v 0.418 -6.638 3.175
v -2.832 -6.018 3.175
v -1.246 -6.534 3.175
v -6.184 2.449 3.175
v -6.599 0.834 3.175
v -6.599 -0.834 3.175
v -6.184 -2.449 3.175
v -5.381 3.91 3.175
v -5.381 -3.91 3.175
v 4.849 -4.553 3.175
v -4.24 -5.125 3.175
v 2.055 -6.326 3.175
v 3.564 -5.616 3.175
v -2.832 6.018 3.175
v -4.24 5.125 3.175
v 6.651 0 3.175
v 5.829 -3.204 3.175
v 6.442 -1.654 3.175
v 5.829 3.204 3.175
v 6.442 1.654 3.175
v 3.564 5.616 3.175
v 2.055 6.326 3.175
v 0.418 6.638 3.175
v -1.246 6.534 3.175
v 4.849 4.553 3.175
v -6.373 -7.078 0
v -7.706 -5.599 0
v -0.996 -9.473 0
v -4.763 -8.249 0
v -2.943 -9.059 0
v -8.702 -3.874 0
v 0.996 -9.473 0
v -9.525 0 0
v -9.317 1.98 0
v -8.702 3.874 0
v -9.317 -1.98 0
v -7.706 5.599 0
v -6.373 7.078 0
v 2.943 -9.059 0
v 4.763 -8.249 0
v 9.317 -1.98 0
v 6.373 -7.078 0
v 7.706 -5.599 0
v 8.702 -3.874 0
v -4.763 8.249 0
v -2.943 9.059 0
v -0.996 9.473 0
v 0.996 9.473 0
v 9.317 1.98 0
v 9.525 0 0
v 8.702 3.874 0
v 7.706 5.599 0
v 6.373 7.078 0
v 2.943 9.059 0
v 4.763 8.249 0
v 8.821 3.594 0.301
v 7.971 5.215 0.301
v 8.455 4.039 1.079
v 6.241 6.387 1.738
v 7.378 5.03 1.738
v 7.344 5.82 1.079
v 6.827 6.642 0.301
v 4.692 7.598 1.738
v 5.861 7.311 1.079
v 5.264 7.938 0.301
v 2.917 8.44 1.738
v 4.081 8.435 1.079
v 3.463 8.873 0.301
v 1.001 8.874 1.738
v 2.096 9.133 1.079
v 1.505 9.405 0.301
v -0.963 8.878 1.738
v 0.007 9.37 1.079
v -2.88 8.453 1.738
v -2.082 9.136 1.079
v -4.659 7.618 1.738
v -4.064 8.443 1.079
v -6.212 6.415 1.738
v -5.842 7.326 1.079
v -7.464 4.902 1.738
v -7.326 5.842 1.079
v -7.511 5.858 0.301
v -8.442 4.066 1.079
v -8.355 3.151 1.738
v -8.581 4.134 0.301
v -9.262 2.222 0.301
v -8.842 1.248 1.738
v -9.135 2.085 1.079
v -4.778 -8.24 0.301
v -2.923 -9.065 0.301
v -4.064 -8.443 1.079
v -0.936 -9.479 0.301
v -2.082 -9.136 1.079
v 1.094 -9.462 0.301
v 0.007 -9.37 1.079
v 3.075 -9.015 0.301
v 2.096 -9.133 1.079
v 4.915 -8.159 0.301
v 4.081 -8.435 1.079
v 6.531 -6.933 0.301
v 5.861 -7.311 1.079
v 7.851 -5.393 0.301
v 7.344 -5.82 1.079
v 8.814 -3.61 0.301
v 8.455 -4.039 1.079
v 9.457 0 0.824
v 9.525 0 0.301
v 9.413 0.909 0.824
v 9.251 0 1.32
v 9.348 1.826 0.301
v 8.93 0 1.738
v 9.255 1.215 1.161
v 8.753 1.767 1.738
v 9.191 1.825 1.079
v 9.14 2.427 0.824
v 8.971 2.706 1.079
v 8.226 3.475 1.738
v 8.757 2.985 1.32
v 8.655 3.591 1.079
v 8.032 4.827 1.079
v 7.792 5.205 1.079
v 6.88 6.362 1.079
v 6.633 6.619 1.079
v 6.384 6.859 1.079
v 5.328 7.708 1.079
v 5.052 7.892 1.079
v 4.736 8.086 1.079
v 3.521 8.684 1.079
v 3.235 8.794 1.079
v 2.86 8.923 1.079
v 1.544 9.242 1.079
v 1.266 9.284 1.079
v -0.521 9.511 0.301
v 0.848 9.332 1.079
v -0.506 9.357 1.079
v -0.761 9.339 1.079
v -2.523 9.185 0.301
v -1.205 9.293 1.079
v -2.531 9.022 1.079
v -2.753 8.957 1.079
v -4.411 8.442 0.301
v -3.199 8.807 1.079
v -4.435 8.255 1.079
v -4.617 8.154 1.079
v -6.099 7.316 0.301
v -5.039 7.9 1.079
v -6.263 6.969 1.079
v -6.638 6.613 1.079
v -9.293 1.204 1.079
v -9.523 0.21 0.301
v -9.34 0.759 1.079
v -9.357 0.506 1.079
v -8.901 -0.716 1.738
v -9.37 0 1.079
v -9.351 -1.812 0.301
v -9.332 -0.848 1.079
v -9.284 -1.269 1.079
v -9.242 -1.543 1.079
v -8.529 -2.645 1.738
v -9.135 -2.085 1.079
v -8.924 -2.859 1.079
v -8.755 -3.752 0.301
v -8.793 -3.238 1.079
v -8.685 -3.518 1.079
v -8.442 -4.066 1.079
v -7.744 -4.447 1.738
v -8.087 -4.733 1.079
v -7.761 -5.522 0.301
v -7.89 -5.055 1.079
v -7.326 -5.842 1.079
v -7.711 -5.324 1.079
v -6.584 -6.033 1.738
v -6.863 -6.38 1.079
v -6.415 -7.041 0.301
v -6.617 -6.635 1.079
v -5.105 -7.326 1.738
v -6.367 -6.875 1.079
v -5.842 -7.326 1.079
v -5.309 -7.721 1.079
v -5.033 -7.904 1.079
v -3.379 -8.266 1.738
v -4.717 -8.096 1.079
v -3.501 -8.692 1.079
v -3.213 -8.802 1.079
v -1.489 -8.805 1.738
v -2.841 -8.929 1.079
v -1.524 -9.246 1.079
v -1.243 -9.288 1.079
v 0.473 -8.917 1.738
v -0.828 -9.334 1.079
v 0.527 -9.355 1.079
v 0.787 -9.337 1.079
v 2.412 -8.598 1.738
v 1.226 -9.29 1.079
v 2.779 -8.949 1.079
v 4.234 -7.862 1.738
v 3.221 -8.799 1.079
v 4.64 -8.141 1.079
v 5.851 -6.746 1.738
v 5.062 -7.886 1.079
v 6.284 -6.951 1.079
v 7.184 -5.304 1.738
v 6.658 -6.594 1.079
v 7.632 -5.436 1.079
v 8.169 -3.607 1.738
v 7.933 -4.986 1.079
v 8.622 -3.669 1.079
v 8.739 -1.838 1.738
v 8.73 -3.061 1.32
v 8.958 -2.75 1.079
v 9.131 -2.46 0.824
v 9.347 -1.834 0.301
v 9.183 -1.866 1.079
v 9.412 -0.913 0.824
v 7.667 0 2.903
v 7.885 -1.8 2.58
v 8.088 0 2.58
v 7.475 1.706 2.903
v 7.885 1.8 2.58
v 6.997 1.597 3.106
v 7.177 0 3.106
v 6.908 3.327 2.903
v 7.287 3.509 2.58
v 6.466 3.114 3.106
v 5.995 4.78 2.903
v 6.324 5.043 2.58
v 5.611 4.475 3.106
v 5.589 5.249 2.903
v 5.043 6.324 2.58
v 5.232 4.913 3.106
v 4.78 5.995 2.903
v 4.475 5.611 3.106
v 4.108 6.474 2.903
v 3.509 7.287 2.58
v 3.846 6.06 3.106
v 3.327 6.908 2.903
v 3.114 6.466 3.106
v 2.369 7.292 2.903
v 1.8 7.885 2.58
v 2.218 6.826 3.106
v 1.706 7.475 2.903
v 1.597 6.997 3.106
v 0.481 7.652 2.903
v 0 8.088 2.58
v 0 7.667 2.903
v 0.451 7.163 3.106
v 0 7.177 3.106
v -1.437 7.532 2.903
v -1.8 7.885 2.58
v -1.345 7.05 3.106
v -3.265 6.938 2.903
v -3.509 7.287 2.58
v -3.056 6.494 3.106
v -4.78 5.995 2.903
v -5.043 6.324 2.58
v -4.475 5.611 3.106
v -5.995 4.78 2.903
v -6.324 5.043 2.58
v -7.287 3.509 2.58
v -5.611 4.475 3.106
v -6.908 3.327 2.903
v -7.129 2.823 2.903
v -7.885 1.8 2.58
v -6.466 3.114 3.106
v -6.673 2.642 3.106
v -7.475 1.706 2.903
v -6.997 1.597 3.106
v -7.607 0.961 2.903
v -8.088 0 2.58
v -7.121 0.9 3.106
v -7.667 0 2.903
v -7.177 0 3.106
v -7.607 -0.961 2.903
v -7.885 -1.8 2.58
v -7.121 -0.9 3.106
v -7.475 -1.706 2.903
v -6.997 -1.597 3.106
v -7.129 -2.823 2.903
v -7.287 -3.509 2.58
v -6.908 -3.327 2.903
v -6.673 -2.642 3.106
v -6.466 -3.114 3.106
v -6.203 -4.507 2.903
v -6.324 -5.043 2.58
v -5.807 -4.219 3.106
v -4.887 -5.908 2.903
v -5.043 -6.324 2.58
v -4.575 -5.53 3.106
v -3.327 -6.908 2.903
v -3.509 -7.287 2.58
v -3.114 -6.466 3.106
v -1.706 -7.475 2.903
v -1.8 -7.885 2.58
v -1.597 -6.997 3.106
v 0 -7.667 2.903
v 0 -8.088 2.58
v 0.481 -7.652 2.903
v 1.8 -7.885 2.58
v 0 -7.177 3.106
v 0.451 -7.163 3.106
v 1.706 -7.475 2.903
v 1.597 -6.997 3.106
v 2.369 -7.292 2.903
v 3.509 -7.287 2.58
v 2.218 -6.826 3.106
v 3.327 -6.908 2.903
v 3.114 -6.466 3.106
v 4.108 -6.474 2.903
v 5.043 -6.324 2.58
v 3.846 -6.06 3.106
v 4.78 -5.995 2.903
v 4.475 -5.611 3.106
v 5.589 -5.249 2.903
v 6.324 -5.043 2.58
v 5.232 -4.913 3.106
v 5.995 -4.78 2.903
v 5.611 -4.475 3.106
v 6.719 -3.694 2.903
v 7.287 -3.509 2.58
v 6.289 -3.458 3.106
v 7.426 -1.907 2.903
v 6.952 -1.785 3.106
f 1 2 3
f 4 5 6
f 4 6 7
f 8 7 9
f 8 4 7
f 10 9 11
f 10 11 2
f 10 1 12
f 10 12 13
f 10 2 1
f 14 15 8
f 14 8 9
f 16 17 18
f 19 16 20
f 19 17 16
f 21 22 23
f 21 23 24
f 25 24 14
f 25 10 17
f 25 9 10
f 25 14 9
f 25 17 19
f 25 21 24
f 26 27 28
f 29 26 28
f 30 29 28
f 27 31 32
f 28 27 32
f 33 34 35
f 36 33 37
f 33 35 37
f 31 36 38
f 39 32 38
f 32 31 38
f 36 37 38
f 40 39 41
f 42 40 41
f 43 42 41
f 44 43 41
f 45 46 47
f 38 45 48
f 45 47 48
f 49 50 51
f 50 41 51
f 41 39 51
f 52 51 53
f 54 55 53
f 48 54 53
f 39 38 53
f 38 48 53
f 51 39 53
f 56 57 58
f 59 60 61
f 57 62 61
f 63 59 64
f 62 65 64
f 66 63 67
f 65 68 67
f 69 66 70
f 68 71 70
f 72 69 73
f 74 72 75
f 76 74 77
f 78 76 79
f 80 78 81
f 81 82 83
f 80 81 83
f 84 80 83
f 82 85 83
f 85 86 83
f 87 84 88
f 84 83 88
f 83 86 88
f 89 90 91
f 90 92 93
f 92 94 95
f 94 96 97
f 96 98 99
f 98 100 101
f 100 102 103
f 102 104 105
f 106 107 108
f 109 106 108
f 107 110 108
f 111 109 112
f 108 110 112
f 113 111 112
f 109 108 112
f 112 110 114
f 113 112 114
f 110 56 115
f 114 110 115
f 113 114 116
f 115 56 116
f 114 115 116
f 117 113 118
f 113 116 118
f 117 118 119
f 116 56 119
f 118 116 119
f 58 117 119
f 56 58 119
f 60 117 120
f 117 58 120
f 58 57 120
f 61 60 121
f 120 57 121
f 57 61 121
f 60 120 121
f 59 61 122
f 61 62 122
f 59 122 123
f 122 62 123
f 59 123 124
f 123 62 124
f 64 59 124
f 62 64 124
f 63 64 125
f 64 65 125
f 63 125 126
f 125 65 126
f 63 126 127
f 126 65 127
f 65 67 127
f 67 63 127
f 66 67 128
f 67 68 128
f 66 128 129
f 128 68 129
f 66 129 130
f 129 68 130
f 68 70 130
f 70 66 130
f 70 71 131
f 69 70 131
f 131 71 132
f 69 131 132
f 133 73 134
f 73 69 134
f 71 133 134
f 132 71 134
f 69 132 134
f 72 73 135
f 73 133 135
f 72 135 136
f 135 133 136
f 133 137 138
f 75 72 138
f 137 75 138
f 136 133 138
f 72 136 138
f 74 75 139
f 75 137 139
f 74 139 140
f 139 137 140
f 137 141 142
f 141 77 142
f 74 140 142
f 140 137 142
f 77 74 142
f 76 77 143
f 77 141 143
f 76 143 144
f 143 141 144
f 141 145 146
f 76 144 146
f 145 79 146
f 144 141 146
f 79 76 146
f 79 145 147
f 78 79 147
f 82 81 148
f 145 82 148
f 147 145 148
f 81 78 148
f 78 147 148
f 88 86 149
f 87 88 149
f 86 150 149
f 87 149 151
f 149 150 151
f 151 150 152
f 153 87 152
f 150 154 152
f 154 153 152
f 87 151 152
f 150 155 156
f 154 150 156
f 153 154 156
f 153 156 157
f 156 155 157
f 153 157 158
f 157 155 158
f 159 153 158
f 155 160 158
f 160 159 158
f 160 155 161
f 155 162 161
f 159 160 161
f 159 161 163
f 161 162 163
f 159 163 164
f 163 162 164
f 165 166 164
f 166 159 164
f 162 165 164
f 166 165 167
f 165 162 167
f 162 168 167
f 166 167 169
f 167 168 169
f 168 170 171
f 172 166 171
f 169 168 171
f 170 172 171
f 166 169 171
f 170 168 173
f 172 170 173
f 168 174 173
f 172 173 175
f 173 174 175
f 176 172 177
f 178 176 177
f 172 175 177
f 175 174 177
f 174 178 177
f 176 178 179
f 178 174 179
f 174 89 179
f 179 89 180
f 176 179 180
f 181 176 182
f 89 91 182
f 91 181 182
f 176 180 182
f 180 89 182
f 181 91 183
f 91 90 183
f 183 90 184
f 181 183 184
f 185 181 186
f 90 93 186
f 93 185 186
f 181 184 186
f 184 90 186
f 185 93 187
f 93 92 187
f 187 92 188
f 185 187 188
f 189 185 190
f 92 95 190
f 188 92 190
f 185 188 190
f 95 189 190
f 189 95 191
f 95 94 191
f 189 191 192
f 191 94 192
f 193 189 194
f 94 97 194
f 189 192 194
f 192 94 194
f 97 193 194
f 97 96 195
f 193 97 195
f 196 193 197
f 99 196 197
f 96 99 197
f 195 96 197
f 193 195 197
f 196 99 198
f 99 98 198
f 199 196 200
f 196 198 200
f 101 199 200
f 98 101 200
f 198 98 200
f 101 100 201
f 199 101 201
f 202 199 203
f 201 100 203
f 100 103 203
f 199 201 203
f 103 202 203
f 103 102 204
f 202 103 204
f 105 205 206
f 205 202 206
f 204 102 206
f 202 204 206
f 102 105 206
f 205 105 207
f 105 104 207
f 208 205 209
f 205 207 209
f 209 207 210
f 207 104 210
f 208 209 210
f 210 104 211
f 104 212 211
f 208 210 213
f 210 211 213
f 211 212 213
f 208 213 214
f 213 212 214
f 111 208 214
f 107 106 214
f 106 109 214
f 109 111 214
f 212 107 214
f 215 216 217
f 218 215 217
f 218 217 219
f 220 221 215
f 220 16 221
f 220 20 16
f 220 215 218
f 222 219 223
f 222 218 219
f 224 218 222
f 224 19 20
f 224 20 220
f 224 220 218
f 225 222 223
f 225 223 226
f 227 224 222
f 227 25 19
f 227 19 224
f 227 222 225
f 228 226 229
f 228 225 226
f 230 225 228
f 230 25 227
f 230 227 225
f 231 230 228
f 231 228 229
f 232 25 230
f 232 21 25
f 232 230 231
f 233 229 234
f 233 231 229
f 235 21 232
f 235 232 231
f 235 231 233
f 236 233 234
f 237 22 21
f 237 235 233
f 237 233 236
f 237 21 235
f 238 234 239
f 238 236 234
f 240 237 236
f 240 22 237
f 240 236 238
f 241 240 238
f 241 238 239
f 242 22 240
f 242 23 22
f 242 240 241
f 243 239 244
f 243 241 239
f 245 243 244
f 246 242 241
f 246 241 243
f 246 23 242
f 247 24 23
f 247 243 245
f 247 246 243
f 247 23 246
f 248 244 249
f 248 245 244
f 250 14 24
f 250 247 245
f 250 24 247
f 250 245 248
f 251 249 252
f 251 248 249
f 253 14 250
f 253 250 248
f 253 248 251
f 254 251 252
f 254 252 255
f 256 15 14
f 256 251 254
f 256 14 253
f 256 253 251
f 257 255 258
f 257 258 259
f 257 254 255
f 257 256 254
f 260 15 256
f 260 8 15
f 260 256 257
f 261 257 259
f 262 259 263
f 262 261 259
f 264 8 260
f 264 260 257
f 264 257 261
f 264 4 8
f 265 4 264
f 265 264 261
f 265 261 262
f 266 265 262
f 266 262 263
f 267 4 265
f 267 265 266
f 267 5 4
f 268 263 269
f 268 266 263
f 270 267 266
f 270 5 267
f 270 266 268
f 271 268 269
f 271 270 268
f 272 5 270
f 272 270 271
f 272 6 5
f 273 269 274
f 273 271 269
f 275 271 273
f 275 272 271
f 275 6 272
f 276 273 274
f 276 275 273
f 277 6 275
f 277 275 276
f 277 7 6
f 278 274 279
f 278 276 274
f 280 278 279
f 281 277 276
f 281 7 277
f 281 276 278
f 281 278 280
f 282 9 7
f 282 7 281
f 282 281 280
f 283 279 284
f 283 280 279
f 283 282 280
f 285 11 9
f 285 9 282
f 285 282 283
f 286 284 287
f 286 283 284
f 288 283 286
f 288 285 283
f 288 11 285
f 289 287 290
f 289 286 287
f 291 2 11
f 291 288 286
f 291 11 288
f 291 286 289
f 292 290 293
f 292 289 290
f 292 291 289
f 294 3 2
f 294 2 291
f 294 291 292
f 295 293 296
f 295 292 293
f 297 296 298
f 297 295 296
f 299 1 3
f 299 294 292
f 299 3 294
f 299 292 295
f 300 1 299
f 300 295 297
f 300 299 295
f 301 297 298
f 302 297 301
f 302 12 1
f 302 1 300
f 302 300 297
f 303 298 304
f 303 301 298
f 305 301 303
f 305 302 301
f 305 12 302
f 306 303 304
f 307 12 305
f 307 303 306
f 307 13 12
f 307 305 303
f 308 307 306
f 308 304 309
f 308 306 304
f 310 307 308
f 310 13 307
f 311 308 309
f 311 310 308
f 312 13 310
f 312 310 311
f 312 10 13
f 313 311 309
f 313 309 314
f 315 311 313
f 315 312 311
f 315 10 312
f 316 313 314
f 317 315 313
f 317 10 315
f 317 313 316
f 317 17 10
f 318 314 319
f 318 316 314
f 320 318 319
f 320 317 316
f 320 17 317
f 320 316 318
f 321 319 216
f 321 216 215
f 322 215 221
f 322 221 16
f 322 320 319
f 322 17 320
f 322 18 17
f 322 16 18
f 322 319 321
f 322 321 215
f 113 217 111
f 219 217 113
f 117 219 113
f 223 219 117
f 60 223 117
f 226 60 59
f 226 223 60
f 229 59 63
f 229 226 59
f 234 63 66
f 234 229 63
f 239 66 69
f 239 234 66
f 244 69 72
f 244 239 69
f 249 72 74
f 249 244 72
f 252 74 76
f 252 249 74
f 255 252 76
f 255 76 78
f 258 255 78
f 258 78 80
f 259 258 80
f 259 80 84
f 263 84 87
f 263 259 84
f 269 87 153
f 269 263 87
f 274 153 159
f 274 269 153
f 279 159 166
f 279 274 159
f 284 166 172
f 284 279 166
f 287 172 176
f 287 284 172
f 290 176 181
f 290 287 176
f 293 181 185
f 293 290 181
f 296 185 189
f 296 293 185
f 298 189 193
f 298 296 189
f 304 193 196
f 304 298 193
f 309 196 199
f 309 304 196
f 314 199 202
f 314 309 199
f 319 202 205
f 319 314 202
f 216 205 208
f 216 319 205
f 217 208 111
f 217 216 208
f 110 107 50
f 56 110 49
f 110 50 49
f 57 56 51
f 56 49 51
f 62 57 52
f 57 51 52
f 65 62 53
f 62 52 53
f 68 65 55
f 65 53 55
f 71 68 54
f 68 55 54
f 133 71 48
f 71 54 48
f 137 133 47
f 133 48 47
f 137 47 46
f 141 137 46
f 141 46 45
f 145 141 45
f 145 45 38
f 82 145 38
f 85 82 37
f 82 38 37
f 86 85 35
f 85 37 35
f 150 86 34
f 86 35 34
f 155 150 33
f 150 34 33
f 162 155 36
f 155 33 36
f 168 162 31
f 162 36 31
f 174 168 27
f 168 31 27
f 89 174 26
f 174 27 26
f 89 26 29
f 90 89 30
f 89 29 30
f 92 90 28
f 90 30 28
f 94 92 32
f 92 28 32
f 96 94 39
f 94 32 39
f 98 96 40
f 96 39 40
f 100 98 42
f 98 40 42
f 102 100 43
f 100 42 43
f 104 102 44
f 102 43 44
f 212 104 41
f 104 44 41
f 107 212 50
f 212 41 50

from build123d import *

# Parameters (mm, degrees)
F0_R     = 9.525
F1_DEPTH = 3.175
F2_SIZE  = 2.032
F3_R     = 2.032


with BuildPart() as f1:
    # F0 (on Top) → F1 (new body)
    with BuildSketch(Plane.XY):
        Circle(F0_R)
    extrude(amount=F1_DEPTH)

    # F2
    f2_edges = [f1.edges().sort_by_distance(p)[0] for p in [
        (-9.525, 0, 3.175),
    ]]
    chamfer(f2_edges, length=F2_SIZE)

    # F3
    f3_edges = [f1.edges().sort_by_distance(p)[0] for p in [
        (-7.493, 0, 3.175),
        (-9.525, 0, 1.143),
    ]]
    fillet(f3_edges, radius=F3_R)


solid = f1.part
